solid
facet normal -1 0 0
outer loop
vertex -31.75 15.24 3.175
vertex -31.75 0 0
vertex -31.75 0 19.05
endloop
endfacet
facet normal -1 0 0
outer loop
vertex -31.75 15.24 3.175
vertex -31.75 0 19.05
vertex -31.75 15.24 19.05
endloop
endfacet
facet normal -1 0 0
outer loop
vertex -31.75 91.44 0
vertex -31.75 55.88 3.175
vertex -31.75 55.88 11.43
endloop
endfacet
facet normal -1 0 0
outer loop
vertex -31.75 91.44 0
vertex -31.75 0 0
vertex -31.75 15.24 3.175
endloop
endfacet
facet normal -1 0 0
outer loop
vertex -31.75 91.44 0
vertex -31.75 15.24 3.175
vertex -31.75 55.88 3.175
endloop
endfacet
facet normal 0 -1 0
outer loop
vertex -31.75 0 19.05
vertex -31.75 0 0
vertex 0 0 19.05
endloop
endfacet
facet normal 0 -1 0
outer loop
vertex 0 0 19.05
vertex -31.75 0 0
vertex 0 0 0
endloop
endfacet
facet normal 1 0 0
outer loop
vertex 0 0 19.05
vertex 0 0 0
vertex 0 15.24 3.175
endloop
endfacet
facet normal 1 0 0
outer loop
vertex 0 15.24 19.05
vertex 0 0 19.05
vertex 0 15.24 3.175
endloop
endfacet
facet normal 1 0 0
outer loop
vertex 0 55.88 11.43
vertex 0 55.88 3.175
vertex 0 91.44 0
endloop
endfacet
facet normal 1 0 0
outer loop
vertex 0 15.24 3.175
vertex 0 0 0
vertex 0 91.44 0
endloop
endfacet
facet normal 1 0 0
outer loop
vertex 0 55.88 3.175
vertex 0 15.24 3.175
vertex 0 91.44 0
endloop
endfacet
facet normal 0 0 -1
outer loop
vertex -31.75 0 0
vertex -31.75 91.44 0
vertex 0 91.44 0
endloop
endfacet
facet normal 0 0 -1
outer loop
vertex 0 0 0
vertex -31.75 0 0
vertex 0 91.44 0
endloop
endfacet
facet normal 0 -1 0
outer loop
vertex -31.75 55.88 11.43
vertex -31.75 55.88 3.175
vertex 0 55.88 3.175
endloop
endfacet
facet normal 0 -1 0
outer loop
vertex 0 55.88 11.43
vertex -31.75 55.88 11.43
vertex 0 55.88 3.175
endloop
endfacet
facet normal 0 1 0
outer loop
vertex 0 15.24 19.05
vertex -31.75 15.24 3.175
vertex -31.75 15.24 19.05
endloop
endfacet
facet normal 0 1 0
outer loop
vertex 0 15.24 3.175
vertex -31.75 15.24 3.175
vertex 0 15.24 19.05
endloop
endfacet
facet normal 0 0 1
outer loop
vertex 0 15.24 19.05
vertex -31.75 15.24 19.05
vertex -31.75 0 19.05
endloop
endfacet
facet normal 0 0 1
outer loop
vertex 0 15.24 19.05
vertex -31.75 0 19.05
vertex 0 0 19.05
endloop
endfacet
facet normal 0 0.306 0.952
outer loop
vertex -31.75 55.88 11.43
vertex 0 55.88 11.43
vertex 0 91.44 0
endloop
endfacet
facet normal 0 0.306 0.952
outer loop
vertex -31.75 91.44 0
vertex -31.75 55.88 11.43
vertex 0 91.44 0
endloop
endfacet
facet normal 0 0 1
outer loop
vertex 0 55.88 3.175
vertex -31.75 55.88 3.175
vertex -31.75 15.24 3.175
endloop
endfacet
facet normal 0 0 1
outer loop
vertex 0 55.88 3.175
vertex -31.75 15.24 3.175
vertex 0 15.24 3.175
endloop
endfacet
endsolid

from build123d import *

# Parameters (mm, degrees)
F0_W     = 31.75
F0_H     = 40.64
F1_DEPTH = 3.175
F0_H_2   = 15.24
F2_DEPTH = 19.05
F0_H_3   = 35.56
F3_DEPTH = 11.43
F5_DEPTH = 31.75


with BuildPart() as f1:
    # F0 (on Top) → F1 (new body)
    with BuildSketch(Plane.XY):
        with Locations((-15.875, 35.56)):
            Rectangle(F0_W, F0_H)
    extrude(amount=F1_DEPTH)

    # F0 (on Top) → F2 (join)
    with BuildSketch(Plane.XY):
        with Locations((-15.875, 7.62)):
            Rectangle(F0_W, F0_H_2)
    extrude(amount=F2_DEPTH)

    # F0 (on Top) → F3 (join)
    with BuildSketch(Plane.XY):
        with Locations((-15.875, 73.66)):
            Rectangle(F0_W, F0_H_3)
    extrude(amount=F3_DEPTH)

    # F4 (on face) → F5 (cut, through all)
    with BuildSketch(Plane.YZ):
        Polygon((91.44, 11.43), (55.88, 11.43), (91.44, 0), align=None)
    extrude(amount=-F5_DEPTH, mode=Mode.SUBTRACT)


solid = f1.part
